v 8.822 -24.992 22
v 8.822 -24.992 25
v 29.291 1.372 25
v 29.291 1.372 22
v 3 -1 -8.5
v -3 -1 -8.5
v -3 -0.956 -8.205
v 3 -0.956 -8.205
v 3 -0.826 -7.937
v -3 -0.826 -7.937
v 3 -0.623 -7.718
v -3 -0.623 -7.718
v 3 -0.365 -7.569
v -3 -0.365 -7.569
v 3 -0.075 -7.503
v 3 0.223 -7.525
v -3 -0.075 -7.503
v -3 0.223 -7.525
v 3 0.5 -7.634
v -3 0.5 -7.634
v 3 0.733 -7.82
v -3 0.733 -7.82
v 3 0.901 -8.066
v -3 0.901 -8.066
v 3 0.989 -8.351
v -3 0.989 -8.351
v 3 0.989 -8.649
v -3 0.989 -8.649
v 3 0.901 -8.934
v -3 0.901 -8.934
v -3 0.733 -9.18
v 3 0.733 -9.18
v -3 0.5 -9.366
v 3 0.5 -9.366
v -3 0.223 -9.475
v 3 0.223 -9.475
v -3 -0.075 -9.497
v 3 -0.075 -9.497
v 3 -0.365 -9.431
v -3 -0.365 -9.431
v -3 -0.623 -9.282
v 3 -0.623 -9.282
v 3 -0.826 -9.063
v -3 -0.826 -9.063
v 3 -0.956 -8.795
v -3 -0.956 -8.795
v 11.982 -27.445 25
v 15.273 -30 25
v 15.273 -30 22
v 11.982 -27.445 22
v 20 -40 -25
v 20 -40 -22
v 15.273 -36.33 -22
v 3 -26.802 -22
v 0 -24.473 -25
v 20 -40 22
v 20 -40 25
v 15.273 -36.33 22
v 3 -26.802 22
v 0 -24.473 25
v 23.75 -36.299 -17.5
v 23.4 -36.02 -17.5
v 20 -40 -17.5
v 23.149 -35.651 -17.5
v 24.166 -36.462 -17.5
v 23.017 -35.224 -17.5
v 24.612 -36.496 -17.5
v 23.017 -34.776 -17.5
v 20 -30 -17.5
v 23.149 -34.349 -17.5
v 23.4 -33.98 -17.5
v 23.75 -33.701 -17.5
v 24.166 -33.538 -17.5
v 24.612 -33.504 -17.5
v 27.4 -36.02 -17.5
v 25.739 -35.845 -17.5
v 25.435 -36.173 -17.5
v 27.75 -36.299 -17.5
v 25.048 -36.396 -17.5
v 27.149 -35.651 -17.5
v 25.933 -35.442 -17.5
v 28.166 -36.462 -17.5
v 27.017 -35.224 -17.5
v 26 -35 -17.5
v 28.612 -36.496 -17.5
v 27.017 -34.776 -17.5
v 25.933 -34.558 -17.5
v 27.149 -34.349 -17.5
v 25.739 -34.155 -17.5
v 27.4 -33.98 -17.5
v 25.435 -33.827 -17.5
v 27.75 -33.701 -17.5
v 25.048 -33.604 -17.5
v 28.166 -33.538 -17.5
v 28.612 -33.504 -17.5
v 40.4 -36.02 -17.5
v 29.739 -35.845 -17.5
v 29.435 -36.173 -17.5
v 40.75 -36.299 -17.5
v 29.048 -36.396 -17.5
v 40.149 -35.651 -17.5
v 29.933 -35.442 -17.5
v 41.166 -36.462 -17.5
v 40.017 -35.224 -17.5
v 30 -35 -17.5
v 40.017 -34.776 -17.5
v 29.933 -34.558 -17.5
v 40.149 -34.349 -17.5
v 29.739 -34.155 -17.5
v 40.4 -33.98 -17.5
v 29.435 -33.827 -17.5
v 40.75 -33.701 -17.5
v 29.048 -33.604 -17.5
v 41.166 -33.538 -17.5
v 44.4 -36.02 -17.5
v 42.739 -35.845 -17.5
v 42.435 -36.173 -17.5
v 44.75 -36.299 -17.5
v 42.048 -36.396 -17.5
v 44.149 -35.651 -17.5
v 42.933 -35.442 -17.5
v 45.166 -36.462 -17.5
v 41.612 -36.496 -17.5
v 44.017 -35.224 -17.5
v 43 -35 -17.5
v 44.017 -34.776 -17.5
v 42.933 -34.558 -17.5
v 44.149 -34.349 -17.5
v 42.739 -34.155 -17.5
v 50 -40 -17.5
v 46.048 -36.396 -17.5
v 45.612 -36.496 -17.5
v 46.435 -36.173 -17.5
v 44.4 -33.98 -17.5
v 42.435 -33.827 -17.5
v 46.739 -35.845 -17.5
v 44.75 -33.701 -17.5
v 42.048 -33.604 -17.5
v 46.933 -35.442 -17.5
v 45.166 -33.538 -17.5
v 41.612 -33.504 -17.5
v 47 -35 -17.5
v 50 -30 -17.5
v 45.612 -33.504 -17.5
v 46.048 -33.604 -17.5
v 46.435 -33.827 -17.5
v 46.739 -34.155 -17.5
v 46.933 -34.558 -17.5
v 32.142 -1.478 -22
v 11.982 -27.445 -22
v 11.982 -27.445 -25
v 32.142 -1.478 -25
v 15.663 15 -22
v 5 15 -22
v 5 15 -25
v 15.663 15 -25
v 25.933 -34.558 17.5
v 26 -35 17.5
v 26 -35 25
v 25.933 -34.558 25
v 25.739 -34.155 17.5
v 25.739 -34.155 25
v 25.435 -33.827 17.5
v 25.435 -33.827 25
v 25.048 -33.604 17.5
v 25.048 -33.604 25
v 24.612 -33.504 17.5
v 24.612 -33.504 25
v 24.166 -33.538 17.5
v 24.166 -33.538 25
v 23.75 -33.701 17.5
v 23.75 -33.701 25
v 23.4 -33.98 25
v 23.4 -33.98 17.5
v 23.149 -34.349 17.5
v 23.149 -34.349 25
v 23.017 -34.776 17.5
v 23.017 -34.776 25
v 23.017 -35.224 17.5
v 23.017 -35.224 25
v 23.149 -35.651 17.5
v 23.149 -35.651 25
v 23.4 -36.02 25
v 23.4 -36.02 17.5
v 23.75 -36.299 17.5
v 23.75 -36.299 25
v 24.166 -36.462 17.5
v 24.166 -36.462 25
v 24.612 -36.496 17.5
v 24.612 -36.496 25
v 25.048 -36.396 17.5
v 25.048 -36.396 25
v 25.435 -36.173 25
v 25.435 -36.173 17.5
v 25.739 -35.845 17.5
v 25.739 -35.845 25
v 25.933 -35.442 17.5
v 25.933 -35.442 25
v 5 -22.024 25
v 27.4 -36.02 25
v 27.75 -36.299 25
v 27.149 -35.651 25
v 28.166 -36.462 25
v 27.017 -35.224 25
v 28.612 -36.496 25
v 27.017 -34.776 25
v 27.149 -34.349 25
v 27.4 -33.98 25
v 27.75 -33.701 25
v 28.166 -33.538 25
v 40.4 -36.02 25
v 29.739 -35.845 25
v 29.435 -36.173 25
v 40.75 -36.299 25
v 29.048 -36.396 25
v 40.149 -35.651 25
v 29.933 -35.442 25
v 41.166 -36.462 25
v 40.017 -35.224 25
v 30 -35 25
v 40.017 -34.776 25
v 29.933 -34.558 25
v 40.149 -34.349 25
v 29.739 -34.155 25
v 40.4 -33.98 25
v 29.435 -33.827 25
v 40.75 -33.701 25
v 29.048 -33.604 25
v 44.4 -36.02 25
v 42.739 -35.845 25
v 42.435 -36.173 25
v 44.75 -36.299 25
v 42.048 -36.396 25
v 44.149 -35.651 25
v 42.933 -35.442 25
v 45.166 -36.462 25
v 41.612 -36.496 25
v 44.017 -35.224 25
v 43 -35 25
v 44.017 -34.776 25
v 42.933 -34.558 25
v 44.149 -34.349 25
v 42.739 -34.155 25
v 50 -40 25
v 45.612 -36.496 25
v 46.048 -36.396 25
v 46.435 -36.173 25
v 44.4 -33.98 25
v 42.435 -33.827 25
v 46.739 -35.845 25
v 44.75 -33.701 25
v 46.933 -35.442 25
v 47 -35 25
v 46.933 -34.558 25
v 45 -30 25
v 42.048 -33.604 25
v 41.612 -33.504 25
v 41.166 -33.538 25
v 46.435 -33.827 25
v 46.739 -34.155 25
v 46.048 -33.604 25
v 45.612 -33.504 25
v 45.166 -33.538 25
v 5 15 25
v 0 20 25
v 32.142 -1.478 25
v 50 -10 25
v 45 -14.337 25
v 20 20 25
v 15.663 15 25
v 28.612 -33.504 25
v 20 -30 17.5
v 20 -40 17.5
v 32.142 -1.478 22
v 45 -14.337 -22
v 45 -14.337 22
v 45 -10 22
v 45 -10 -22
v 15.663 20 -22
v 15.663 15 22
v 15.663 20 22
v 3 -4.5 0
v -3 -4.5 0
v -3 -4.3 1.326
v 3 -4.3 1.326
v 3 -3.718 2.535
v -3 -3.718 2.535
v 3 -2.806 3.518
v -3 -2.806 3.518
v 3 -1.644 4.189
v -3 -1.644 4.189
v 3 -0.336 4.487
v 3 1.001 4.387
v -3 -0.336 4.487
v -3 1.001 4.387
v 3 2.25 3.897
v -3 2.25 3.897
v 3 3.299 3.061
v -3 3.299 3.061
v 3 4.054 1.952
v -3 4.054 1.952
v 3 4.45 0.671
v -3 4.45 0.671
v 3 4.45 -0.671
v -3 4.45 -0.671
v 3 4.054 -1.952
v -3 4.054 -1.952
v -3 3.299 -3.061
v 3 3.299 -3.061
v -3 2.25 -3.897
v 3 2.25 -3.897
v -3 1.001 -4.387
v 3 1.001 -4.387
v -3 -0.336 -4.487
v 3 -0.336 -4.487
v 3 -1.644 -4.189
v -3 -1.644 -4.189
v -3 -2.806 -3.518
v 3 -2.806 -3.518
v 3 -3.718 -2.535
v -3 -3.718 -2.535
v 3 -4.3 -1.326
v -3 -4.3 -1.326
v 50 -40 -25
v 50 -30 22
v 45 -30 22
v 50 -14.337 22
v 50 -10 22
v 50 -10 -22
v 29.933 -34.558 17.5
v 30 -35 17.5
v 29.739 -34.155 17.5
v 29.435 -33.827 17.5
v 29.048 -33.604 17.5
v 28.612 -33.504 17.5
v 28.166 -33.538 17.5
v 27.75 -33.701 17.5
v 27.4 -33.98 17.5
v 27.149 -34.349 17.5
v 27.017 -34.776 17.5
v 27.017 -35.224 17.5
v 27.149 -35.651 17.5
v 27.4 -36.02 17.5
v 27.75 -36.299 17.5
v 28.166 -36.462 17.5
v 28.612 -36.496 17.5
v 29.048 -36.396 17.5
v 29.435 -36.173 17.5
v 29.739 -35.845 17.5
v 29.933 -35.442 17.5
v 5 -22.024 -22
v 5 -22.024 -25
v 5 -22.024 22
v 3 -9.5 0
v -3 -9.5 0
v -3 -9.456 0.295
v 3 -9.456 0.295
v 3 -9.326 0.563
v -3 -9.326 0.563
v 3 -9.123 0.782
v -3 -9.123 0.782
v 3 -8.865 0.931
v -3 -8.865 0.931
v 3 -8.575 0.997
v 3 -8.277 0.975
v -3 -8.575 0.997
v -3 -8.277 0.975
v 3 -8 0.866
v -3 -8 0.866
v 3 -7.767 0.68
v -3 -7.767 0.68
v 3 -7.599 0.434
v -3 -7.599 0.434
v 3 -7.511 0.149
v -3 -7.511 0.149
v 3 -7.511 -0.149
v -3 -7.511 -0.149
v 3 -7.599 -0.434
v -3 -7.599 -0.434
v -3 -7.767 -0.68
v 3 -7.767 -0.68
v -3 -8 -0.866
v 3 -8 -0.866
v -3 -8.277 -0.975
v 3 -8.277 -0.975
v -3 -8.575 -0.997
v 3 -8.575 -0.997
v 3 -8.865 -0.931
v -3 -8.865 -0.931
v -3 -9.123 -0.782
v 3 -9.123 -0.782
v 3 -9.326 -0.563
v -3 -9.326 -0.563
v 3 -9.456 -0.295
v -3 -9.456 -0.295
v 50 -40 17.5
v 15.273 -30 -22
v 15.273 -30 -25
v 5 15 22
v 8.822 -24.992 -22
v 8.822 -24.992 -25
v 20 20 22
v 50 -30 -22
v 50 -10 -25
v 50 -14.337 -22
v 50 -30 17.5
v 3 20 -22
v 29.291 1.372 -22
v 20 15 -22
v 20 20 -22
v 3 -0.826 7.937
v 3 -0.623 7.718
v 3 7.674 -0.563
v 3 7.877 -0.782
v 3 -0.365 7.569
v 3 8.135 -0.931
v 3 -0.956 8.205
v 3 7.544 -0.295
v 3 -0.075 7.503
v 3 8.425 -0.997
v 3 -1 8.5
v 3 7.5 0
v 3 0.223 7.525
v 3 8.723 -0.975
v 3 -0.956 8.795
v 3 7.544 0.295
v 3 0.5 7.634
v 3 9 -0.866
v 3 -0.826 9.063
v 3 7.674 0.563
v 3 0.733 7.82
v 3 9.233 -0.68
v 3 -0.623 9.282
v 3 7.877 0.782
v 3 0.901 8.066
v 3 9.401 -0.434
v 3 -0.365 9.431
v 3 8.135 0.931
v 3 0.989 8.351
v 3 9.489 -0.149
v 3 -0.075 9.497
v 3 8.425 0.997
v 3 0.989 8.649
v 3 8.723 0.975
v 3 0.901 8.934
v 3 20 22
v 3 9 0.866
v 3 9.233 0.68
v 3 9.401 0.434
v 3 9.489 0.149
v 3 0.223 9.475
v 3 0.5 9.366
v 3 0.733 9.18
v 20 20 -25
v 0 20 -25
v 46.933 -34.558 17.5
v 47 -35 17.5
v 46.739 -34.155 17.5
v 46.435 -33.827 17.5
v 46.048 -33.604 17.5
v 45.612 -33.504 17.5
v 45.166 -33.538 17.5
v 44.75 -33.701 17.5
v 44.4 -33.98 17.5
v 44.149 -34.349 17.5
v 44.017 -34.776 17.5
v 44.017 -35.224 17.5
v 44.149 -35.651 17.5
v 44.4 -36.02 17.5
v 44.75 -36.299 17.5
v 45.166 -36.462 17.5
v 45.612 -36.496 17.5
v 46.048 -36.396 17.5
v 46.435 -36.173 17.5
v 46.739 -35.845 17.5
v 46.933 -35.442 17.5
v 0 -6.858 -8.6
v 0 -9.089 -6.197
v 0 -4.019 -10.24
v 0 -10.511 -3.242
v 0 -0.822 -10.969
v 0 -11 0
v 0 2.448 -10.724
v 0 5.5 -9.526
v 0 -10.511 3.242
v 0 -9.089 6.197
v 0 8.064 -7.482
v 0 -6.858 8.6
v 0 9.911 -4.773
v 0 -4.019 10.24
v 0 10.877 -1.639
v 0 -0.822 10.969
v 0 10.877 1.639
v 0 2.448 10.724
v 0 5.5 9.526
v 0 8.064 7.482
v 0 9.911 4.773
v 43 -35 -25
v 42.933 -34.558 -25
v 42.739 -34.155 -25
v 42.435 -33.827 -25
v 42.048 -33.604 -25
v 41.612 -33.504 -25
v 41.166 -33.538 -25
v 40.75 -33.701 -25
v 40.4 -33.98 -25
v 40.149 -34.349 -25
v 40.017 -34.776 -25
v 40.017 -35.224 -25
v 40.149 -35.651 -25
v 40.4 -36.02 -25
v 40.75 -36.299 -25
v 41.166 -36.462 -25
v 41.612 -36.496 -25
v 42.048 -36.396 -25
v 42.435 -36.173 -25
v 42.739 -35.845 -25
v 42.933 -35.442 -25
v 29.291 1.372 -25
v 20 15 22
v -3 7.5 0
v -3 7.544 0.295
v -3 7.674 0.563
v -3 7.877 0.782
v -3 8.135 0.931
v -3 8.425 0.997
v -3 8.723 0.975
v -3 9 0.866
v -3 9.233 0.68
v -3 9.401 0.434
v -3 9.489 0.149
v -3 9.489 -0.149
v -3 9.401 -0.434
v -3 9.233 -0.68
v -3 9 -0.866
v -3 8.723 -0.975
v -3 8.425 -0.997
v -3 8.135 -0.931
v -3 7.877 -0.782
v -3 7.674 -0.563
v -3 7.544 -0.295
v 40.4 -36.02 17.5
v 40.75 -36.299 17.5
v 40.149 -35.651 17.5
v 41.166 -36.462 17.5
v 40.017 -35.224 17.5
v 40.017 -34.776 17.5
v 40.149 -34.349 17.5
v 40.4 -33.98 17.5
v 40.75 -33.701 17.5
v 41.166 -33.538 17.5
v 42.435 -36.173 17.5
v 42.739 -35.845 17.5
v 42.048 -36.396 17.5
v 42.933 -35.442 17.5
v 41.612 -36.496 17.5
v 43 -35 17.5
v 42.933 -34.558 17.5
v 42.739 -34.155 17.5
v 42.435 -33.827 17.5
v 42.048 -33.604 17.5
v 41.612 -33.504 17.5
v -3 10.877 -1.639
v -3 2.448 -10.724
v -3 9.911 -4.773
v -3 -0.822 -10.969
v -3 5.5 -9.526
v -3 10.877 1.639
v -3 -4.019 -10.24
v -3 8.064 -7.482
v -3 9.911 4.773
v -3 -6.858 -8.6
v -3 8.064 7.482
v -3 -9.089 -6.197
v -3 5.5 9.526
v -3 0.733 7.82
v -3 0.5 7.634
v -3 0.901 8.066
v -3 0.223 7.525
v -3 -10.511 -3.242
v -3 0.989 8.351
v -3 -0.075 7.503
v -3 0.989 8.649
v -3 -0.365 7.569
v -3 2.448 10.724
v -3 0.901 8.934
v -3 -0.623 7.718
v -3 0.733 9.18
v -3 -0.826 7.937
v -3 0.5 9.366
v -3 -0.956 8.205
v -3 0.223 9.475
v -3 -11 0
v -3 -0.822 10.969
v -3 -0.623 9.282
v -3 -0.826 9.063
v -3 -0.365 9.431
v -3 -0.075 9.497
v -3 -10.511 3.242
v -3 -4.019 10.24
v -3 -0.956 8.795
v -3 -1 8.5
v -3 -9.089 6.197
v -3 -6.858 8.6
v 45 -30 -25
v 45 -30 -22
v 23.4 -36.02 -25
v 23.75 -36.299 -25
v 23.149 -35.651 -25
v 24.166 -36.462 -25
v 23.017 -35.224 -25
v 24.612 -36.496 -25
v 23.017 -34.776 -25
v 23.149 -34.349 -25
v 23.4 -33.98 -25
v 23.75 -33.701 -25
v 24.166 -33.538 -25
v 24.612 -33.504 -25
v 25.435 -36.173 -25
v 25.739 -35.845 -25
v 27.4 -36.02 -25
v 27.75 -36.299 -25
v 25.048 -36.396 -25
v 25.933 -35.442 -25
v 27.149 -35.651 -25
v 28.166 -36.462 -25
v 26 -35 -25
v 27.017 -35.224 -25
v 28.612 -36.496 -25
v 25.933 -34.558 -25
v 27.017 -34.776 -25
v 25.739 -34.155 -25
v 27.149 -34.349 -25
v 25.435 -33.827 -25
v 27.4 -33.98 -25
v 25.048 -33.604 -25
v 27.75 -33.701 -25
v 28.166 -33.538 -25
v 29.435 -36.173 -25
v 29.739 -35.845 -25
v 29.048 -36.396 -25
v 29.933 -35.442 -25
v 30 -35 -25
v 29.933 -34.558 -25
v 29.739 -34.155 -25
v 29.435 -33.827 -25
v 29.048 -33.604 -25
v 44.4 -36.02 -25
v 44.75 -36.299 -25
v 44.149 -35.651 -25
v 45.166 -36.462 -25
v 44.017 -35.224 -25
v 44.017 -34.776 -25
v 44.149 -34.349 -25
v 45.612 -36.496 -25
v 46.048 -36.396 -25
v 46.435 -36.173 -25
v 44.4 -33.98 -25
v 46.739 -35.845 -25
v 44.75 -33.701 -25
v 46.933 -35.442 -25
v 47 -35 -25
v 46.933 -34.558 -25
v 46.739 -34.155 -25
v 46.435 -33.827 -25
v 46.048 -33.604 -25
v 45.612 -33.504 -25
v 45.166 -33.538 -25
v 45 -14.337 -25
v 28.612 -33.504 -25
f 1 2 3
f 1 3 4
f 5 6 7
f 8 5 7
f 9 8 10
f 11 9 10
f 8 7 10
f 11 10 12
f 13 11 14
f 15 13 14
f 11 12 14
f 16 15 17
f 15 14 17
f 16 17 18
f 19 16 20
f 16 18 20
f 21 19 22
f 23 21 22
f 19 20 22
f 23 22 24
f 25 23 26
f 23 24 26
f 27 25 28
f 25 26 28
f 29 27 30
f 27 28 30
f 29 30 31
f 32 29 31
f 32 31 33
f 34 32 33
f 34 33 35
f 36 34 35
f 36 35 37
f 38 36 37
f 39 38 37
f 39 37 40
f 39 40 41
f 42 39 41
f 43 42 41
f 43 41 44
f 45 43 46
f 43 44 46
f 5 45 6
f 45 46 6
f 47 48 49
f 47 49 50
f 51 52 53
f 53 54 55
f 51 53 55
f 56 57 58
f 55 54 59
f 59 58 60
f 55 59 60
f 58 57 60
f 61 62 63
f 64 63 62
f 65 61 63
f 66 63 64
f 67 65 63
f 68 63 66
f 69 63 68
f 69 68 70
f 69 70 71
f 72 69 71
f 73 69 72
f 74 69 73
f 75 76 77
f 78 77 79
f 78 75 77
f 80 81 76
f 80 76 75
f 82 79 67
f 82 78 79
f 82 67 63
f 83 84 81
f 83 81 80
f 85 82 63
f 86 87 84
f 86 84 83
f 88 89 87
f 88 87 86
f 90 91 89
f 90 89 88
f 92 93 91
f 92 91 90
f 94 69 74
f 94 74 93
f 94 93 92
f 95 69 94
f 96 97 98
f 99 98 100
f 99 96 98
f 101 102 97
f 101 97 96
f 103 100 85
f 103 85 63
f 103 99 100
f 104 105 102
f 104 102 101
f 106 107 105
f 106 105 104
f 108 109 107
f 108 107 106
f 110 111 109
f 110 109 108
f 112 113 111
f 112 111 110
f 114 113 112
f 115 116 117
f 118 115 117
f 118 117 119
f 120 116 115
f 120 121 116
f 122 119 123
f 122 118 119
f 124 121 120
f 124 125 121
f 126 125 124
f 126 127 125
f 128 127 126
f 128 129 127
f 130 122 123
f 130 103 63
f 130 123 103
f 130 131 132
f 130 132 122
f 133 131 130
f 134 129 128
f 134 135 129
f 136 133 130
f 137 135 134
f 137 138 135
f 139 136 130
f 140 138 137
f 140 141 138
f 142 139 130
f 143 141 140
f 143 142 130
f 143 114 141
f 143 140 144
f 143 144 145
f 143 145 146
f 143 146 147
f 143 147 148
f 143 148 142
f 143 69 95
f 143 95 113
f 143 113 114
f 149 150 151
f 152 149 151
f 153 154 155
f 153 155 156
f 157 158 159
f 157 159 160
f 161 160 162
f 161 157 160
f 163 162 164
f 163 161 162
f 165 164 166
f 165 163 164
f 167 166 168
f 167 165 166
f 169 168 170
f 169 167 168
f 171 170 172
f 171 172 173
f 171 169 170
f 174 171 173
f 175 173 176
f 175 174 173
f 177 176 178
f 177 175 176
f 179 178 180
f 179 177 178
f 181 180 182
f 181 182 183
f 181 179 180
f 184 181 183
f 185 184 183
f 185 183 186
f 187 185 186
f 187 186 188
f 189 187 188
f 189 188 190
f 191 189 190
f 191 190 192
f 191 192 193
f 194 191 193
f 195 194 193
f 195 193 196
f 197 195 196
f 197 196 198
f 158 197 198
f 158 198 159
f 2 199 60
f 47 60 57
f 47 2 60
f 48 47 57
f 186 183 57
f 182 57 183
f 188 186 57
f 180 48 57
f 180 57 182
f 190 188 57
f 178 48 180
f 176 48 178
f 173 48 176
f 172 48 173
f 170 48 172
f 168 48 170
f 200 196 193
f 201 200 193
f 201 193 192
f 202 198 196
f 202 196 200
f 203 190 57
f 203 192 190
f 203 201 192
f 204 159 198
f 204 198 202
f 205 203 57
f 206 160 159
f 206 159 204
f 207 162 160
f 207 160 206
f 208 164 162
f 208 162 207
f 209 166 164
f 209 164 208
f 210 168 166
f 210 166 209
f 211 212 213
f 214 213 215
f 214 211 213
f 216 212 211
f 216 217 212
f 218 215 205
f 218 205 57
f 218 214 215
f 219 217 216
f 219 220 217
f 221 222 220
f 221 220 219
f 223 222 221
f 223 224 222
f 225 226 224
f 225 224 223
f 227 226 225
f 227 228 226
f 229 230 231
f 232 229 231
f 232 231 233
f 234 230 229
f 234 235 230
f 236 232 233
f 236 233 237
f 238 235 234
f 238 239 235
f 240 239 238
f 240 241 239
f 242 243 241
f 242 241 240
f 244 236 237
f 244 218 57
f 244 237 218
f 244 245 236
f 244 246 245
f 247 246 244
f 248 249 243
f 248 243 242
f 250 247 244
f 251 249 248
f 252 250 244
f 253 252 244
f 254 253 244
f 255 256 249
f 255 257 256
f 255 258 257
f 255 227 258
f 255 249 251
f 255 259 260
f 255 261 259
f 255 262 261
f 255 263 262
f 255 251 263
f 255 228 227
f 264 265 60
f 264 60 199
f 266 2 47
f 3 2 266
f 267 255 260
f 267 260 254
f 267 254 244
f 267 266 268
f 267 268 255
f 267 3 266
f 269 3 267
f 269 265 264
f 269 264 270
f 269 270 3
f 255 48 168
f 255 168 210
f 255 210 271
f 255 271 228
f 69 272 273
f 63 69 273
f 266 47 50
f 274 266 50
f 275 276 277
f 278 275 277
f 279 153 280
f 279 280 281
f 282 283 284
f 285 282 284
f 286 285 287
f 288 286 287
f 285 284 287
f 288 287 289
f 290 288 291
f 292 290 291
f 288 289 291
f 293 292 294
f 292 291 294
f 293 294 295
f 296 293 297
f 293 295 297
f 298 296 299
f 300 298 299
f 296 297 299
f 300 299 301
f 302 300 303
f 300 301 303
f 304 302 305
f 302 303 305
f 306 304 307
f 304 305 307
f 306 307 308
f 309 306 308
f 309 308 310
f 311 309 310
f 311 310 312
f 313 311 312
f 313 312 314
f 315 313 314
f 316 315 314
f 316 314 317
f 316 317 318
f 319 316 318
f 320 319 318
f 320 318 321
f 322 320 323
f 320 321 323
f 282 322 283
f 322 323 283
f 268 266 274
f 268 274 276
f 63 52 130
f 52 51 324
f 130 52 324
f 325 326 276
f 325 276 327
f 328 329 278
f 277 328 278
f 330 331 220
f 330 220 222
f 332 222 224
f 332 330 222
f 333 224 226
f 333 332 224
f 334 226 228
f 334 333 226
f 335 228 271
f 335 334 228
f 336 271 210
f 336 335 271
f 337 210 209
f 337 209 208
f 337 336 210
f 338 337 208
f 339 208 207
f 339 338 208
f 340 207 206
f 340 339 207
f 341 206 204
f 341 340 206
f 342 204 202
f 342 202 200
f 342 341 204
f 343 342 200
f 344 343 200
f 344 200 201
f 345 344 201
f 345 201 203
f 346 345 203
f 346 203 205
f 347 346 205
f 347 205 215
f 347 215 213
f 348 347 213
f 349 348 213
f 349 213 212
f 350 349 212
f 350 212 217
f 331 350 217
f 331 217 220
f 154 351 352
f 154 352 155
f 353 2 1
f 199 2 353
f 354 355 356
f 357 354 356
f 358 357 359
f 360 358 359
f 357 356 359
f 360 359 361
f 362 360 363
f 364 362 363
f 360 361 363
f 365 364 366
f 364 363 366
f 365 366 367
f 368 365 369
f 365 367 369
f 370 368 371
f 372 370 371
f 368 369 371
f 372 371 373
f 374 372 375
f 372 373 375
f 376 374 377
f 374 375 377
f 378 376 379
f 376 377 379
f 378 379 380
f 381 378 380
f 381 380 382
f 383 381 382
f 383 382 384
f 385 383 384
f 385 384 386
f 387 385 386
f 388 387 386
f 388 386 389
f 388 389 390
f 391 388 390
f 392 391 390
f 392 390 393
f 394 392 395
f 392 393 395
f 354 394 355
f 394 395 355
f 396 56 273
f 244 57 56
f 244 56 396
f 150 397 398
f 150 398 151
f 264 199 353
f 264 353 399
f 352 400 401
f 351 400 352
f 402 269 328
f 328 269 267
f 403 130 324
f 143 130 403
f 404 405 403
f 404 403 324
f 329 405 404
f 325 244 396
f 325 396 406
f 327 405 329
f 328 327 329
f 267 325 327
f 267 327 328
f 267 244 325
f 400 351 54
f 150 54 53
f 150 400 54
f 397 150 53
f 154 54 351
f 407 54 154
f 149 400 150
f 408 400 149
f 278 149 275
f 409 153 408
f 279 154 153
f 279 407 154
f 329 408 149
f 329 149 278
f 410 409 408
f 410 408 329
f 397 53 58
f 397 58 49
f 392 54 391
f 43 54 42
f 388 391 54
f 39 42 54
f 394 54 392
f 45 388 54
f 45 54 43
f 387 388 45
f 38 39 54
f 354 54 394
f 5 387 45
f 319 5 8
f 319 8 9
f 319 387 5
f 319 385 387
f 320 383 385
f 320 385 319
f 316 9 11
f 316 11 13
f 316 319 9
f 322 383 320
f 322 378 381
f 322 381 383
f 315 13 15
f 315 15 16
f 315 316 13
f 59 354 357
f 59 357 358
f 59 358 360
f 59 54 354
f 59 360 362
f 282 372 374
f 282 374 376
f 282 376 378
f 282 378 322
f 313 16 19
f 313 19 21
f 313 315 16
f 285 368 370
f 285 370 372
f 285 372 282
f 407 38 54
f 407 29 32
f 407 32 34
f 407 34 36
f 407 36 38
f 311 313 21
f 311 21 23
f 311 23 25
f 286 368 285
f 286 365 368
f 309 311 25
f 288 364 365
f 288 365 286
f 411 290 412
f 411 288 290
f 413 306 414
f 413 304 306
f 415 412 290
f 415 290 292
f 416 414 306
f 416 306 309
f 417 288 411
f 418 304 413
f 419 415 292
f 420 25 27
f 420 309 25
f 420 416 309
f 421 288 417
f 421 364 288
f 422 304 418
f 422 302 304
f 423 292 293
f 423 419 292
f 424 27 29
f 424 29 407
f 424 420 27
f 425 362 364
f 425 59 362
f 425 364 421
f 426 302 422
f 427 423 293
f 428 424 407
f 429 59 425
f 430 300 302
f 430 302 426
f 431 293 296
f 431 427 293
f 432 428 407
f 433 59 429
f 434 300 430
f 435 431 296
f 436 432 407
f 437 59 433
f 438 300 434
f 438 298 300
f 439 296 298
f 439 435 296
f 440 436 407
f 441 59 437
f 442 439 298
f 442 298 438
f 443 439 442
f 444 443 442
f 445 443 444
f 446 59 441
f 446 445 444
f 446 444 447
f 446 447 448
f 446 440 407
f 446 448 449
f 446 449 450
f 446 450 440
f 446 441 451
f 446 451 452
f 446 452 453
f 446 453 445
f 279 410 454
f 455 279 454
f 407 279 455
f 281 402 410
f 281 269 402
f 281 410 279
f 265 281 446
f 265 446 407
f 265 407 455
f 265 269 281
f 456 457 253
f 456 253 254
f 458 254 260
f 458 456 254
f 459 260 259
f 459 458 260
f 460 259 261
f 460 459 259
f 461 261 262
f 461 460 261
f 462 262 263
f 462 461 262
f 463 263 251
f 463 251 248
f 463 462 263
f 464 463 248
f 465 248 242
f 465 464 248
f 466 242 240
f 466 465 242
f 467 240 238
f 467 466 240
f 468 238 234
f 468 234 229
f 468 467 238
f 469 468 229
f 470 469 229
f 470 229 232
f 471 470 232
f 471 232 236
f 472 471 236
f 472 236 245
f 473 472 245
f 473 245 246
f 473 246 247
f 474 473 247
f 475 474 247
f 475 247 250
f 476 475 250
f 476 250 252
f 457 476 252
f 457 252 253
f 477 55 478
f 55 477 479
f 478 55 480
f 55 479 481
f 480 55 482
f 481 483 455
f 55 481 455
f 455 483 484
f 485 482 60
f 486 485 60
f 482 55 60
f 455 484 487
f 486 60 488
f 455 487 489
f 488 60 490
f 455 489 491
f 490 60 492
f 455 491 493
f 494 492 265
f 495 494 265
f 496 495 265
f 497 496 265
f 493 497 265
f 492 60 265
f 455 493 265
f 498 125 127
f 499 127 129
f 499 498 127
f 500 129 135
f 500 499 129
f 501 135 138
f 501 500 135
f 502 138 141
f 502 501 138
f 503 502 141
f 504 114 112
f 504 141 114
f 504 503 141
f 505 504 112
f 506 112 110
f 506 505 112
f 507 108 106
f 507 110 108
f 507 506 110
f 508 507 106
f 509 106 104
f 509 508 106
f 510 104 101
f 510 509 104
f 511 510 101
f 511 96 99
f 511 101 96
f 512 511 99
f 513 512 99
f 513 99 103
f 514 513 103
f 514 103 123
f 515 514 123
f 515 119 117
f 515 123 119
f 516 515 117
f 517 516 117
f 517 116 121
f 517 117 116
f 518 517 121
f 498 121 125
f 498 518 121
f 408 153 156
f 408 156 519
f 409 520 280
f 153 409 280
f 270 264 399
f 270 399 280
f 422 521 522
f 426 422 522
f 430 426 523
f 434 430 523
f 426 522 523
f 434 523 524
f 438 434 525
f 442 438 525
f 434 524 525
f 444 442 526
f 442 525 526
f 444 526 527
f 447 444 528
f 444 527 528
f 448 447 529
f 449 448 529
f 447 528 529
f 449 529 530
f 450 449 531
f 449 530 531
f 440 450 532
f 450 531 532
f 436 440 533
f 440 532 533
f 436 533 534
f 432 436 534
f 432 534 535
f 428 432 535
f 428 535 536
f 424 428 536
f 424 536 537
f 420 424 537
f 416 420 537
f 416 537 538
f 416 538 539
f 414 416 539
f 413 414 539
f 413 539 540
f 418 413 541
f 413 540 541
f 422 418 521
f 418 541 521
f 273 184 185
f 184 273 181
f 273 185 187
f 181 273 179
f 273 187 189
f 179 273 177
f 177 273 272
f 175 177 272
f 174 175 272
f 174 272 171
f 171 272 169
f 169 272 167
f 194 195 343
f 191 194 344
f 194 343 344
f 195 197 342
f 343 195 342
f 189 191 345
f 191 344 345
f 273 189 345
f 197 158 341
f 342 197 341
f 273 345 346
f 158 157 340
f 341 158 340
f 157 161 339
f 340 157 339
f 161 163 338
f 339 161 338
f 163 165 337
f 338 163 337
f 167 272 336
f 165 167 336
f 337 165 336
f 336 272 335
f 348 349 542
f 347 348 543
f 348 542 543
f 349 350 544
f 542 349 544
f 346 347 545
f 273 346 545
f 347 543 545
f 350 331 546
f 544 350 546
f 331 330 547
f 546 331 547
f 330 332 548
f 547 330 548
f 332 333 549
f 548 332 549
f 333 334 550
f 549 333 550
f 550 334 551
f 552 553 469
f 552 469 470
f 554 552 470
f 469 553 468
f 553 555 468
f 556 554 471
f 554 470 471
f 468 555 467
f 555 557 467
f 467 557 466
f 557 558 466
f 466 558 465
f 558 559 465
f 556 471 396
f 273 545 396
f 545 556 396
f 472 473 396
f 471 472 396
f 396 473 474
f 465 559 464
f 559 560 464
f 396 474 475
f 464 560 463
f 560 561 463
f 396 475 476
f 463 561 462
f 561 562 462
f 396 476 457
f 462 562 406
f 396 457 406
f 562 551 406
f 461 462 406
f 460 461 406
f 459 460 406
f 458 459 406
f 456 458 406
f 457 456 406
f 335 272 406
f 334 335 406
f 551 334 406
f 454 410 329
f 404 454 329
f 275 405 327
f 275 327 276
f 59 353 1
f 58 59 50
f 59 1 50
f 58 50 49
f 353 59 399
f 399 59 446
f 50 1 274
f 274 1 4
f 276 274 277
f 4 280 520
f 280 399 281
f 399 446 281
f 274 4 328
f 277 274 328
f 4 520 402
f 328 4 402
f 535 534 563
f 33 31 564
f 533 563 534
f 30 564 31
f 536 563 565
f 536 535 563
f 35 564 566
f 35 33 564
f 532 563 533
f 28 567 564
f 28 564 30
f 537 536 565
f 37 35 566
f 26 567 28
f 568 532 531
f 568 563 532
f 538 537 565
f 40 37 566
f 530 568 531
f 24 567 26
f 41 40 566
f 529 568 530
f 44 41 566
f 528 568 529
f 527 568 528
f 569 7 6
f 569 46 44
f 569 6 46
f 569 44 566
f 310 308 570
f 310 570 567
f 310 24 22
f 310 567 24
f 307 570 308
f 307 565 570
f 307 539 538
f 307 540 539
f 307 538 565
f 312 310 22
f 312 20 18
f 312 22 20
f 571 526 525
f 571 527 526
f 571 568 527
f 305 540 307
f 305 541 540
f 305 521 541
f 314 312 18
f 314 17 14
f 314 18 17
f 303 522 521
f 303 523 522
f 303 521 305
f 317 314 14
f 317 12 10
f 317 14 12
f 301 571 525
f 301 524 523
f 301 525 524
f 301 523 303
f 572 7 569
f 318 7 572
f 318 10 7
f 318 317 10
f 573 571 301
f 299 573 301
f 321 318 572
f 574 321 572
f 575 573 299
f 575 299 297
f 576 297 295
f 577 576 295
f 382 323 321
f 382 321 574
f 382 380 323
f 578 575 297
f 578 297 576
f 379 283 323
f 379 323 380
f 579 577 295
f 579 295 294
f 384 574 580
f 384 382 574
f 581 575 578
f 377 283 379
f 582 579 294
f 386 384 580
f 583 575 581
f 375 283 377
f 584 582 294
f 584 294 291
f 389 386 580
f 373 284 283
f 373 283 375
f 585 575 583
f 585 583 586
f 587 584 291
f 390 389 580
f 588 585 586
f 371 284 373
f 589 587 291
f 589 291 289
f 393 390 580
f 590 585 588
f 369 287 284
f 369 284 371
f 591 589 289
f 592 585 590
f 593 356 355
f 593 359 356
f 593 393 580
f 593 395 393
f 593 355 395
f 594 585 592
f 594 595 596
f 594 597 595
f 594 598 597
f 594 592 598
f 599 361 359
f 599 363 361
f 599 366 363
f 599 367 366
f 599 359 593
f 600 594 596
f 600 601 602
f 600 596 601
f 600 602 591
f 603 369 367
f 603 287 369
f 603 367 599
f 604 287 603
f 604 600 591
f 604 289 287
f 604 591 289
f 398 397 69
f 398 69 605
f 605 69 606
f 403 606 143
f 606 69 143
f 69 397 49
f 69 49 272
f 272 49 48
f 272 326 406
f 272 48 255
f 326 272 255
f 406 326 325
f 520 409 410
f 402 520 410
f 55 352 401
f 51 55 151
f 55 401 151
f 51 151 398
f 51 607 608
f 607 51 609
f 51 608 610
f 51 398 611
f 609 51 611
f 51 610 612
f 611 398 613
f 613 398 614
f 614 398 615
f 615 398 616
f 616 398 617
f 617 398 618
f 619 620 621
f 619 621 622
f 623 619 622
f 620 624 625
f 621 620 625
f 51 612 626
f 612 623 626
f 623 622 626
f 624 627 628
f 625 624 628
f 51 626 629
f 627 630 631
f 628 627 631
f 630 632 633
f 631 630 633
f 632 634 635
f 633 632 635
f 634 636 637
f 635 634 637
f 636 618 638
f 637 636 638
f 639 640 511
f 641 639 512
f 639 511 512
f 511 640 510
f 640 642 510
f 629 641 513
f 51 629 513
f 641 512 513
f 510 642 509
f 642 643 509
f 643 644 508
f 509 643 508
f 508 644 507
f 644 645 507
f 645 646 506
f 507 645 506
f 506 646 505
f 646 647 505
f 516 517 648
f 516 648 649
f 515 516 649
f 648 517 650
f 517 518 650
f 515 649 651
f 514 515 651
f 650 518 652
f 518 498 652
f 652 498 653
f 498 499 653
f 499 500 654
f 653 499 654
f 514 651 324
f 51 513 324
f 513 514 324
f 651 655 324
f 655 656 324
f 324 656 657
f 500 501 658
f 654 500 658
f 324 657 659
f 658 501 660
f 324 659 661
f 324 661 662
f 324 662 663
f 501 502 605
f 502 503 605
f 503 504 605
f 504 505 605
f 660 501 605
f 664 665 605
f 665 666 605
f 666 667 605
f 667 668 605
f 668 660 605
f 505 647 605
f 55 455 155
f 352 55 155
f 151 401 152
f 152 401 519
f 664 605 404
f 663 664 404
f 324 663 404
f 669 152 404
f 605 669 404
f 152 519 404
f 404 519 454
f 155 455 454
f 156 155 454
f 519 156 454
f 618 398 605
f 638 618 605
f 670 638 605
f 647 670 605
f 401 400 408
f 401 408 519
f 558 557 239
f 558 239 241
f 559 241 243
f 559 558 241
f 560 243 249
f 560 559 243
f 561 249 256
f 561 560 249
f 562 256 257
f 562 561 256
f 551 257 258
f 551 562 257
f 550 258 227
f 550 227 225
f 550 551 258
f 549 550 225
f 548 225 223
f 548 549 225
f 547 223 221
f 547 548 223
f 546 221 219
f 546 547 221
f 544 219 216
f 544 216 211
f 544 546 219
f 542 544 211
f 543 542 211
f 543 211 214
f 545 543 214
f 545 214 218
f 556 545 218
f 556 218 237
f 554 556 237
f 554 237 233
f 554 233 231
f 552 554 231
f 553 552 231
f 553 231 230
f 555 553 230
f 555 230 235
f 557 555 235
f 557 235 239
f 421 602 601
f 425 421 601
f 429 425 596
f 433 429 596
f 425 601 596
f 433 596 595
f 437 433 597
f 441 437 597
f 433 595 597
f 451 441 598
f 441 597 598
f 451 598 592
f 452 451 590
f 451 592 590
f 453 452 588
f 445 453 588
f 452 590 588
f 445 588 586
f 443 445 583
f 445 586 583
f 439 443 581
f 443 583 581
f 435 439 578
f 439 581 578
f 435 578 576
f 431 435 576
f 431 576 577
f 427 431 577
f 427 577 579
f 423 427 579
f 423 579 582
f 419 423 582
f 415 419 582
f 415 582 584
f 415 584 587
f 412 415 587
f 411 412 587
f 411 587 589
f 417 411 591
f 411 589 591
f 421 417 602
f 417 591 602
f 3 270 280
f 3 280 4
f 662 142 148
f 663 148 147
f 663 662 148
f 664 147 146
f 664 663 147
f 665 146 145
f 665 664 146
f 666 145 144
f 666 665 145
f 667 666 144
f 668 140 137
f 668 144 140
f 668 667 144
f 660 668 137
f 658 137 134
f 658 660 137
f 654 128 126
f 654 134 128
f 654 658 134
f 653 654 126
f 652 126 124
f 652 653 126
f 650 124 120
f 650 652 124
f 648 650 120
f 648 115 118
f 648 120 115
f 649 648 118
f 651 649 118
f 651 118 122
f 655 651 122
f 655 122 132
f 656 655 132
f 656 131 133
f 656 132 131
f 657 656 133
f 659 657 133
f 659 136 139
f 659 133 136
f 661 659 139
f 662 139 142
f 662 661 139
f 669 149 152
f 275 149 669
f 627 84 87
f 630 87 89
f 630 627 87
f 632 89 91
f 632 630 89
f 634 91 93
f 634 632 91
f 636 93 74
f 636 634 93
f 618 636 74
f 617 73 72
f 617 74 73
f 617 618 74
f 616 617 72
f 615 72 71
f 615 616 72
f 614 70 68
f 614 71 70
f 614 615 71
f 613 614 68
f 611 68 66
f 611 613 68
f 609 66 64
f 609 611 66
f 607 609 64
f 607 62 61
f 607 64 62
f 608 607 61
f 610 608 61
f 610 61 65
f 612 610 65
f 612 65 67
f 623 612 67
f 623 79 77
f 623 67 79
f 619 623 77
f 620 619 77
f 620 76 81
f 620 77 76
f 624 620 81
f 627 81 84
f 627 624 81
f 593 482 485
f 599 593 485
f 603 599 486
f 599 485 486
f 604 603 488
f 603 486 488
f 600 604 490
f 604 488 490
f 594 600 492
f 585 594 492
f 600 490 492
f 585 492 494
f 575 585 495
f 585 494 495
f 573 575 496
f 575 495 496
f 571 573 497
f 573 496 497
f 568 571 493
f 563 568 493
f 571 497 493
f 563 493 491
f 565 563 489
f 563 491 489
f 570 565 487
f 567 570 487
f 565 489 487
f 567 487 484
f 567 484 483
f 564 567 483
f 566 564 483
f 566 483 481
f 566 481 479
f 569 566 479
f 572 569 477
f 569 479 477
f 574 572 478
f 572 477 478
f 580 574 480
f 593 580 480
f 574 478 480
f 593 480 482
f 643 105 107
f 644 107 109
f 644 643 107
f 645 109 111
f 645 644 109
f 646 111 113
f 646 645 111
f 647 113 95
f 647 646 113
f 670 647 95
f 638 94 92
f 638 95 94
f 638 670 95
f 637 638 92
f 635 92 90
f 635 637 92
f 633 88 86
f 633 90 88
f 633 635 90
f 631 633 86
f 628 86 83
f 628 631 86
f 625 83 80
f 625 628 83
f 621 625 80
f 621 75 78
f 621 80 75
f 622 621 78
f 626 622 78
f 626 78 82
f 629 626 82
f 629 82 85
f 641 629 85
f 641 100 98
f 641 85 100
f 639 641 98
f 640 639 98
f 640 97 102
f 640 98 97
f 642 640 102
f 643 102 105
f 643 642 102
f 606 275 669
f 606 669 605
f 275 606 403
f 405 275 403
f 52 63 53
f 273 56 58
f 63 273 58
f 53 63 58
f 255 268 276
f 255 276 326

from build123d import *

# Parameters (mm, degrees)
SKETCH2_W           = 50
SKETCH2_H           = 60
BOSS_EXTRUDE1_DEPTH = 25
SHELL1_T            = -3
SKETCH3_R           = 11
BOSS_EXTRUDE2_DEPTH = 3
SKETCH4_R           = 4.5
SKETCH4_R_2         = 1
CUT_EXTRUDE1_DEPTH  = 6
CUT_EXTRUDE2_REACH  = 83.24
CUT_EXTRUDE4_REACH  = 83.24
SKETCH7_W           = 4.336684694
SKETCH7_H           = 5
SKETCH7_W_2         = 5
SKETCH7_H_2         = 4.336684694
BOSS_EXTRUDE3_DEPTH = 44
BOSS_EXTRUDE4_REACH = 73.148
SKETCH8_W           = 4
SKETCH8_H           = 3
SKETCH10_W          = 30
SKETCH10_H          = 10
BOSS_EXTRUDE5_DEPTH = 4.5
CUT_EXTRUDE5_START  = -50
SKETCH9_R           = 1.5
CUT_EXTRUDE5_DEPTH  = 50


with BuildPart() as part:
    # Sketch2 → Boss-Extrude1 (new, symmetric)
    with BuildSketch(Plane.XY):
        with Locations((25, -10)):
            Rectangle(SKETCH2_W, SKETCH2_H)
    extrude(amount=BOSS_EXTRUDE1_DEPTH, both=True)

    # Shell1
    shell1_openings = [part.faces().sort_by_distance(p)[0] for p in [
        (25, 20, 0),
        (50, -10, 0),
        (25, -40, 0),
    ]]
    offset(amount=SHELL1_T, openings=shell1_openings, kind=Kind.INTERSECTION)

    # Sketch3 → Boss-Extrude2 (add)
    with BuildSketch(Plane.ZY):
        with Locations(Location((0, 0, 0), (0, 0, 270))):
            Circle(SKETCH3_R)
    extrude(amount=BOSS_EXTRUDE2_DEPTH)

    # Sketch4 → Cut-Extrude1 (cut)
    with BuildSketch(Plane.ZY.offset(3)):
        with Locations(Location((0, 0, 0), (0, 0, 270))):
            Circle(SKETCH4_R)
        with Locations(Location((-8.5, 0, 0), (0, 0, 270))):
            Circle(SKETCH4_R_2)
        with Locations(Location((0, 8.5, 0), (0, 0, 270))):
            Circle(SKETCH4_R_2)
        with Locations(Location((8.5, 0, 0), (0, 0, 270))):
            Circle(SKETCH4_R_2)
        with Locations(Location((0, -8.5, 0), (0, 0, 270))):
            Circle(SKETCH4_R_2)
    extrude(amount=-CUT_EXTRUDE1_DEPTH, mode=Mode.SUBTRACT)

    # Cut-Extrude2: up to this face of the body (flat: up to its plane)
    cut_extrude2_end = Plane(part.part.faces().sort_by_distance((25, -10, -25))[0])
    # Sketch5 → Cut-Extrude2 (cut, up to the picked face)
    with BuildSketch(Plane.XY.offset(25), mode=Mode.PRIVATE) as cut_extrude2_sk1:
        Polygon((0, -24.472587055), (0, -40), (20, -40), align=None)
    cut_extrude2_tool1 = split(extrude(cut_extrude2_sk1.sketch, amount=-CUT_EXTRUDE2_REACH, mode=Mode.PRIVATE), bisect_by=cut_extrude2_end, keep=Keep.BOTH, mode=Mode.PRIVATE)
    # Sketch5 → Cut-Extrude2 (cut, up to the picked face)
    with BuildSketch(Plane.XY.offset(25), mode=Mode.PRIVATE) as cut_extrude2_sk2:
        Polygon((20, 20), (50, -10), (50, 20), align=None)
    cut_extrude2_tool2 = split(extrude(cut_extrude2_sk2.sketch, amount=-CUT_EXTRUDE2_REACH, mode=Mode.PRIVATE), bisect_by=cut_extrude2_end, keep=Keep.BOTH, mode=Mode.PRIVATE)
    add(cut_extrude2_tool1.solids().sort_by(Axis((6.666667, -34.824196, 25), (0, 0, -1)))[0], mode=Mode.SUBTRACT)
    add(cut_extrude2_tool2.solids().sort_by(Axis((40, 10, 25), (0, 0, -1)))[0], mode=Mode.SUBTRACT)

    # Cut-Extrude4: up to this face of the body (flat: up to its plane)
    cut_extrude4_end = Plane(part.part.faces().sort_by_distance((23.370039897, -12.148657051, -25))[0])
    # Sketch6 → Cut-Extrude4 (cut, up to the picked face)
    with BuildSketch(Plane.XY.offset(25), mode=Mode.PRIVATE) as cut_extrude4_sk1:
        Polygon((5, 15), (15.663315306, 15), (45, -14.336684694), (45, -30), (15.272864665, -30), (5, -22.024449411), align=None)
    cut_extrude4_tool1 = split(extrude(cut_extrude4_sk1.sketch, amount=-CUT_EXTRUDE4_REACH, mode=Mode.PRIVATE), bisect_by=cut_extrude4_end, keep=Keep.BOTH, mode=Mode.PRIVATE)
    add(cut_extrude4_tool1.solids().sort_by(Axis((22.200817, -11.008152, 25), (0, 0, -1)))[0], mode=Mode.SUBTRACT)

    # Sketch7 → Boss-Extrude3 (add)
    with BuildSketch(Plane(origin=(0, 0, 22), x_dir=(-1, 0, 0), z_dir=(0, 0, -1))):
        with Locations((-17.831657653, 17.5)):
            Rectangle(SKETCH7_W, SKETCH7_H)
        with Locations((-47.5, -12.168342347)):
            Rectangle(SKETCH7_W_2, SKETCH7_H_2)
        Polygon((-15.272864665, -30), (-20, -30), (-20, -40), (-15.272864665, -36.32999088), align=None)
    extrude(amount=BOSS_EXTRUDE3_DEPTH)

    # Boss-Extrude4: up to this plane
    boss_extrude4_end = Plane(origin=(15.663315306, 15, -85.207972894), z_dir=(0.7071067811865476, 0.7071067811865476, 0))
    # Sketch8 → Boss-Extrude4 (add, up to the surface)
    with BuildSketch(Plane(origin=(-8.788249565, -11.319657172, 0), x_dir=(0.789890553461427, -0.6132478402345992, 0), z_dir=(0.6132478402345992, 0.789890553461427, 0)), mode=Mode.PRIVATE) as boss_extrude4_sk1:
        with Locations((24.294868458, 23.5)):
            Rectangle(SKETCH8_W, SKETCH8_H)
    boss_extrude4_tool1 = split(extrude(boss_extrude4_sk1.sketch, amount=BOSS_EXTRUDE4_REACH, mode=Mode.PRIVATE), bisect_by=boss_extrude4_end, keep=Keep.BOTH, mode=Mode.PRIVATE)
    add(boss_extrude4_tool1.solids().sort_by_distance((10.402038, -26.218433, -23.5))[0])
    # Sketch8 → Boss-Extrude4 (add, up to the surface)
    with BuildSketch(Plane(origin=(-8.788249565, -11.319657172, 0), x_dir=(0.789890553461427, -0.6132478402345992, 0), z_dir=(0.6132478402345992, 0.789890553461427, 0)), mode=Mode.PRIVATE) as boss_extrude4_sk2:
        with Locations((24.294868458, -23.5)):
            Rectangle(SKETCH8_W, SKETCH8_H)
    boss_extrude4_tool2 = split(extrude(boss_extrude4_sk2.sketch, amount=BOSS_EXTRUDE4_REACH, mode=Mode.PRIVATE), bisect_by=boss_extrude4_end, keep=Keep.BOTH, mode=Mode.PRIVATE)
    add(boss_extrude4_tool2.solids().sort_by_distance((10.402038, -26.218433, 23.5))[0])

    # Sketch10 → Boss-Extrude5 (add)
    with BuildSketch(Plane.XY.offset(-22)):
        with Locations((35, -35)):
            Rectangle(SKETCH10_W, SKETCH10_H)
    boss_extrude5 = extrude(amount=BOSS_EXTRUDE5_DEPTH)

    # Mirror1: Boss-Extrude5 across plane
    add(boss_extrude5.mirror(Plane.XY))

    # Sketch9 → Cut-Extrude5 (cut)
    with BuildSketch(Plane.XY.offset(25).offset(CUT_EXTRUDE5_START)):
        with Locations((24.5, -35)):
            Circle(SKETCH9_R)
        with Locations((28.5, -35)):
            Circle(SKETCH9_R)
        with Locations((41.5, -35)):
            Circle(SKETCH9_R)
        with Locations((45.5, -35)):
            Circle(SKETCH9_R)
    extrude(amount=CUT_EXTRUDE5_DEPTH, mode=Mode.SUBTRACT)


solid = part.part
